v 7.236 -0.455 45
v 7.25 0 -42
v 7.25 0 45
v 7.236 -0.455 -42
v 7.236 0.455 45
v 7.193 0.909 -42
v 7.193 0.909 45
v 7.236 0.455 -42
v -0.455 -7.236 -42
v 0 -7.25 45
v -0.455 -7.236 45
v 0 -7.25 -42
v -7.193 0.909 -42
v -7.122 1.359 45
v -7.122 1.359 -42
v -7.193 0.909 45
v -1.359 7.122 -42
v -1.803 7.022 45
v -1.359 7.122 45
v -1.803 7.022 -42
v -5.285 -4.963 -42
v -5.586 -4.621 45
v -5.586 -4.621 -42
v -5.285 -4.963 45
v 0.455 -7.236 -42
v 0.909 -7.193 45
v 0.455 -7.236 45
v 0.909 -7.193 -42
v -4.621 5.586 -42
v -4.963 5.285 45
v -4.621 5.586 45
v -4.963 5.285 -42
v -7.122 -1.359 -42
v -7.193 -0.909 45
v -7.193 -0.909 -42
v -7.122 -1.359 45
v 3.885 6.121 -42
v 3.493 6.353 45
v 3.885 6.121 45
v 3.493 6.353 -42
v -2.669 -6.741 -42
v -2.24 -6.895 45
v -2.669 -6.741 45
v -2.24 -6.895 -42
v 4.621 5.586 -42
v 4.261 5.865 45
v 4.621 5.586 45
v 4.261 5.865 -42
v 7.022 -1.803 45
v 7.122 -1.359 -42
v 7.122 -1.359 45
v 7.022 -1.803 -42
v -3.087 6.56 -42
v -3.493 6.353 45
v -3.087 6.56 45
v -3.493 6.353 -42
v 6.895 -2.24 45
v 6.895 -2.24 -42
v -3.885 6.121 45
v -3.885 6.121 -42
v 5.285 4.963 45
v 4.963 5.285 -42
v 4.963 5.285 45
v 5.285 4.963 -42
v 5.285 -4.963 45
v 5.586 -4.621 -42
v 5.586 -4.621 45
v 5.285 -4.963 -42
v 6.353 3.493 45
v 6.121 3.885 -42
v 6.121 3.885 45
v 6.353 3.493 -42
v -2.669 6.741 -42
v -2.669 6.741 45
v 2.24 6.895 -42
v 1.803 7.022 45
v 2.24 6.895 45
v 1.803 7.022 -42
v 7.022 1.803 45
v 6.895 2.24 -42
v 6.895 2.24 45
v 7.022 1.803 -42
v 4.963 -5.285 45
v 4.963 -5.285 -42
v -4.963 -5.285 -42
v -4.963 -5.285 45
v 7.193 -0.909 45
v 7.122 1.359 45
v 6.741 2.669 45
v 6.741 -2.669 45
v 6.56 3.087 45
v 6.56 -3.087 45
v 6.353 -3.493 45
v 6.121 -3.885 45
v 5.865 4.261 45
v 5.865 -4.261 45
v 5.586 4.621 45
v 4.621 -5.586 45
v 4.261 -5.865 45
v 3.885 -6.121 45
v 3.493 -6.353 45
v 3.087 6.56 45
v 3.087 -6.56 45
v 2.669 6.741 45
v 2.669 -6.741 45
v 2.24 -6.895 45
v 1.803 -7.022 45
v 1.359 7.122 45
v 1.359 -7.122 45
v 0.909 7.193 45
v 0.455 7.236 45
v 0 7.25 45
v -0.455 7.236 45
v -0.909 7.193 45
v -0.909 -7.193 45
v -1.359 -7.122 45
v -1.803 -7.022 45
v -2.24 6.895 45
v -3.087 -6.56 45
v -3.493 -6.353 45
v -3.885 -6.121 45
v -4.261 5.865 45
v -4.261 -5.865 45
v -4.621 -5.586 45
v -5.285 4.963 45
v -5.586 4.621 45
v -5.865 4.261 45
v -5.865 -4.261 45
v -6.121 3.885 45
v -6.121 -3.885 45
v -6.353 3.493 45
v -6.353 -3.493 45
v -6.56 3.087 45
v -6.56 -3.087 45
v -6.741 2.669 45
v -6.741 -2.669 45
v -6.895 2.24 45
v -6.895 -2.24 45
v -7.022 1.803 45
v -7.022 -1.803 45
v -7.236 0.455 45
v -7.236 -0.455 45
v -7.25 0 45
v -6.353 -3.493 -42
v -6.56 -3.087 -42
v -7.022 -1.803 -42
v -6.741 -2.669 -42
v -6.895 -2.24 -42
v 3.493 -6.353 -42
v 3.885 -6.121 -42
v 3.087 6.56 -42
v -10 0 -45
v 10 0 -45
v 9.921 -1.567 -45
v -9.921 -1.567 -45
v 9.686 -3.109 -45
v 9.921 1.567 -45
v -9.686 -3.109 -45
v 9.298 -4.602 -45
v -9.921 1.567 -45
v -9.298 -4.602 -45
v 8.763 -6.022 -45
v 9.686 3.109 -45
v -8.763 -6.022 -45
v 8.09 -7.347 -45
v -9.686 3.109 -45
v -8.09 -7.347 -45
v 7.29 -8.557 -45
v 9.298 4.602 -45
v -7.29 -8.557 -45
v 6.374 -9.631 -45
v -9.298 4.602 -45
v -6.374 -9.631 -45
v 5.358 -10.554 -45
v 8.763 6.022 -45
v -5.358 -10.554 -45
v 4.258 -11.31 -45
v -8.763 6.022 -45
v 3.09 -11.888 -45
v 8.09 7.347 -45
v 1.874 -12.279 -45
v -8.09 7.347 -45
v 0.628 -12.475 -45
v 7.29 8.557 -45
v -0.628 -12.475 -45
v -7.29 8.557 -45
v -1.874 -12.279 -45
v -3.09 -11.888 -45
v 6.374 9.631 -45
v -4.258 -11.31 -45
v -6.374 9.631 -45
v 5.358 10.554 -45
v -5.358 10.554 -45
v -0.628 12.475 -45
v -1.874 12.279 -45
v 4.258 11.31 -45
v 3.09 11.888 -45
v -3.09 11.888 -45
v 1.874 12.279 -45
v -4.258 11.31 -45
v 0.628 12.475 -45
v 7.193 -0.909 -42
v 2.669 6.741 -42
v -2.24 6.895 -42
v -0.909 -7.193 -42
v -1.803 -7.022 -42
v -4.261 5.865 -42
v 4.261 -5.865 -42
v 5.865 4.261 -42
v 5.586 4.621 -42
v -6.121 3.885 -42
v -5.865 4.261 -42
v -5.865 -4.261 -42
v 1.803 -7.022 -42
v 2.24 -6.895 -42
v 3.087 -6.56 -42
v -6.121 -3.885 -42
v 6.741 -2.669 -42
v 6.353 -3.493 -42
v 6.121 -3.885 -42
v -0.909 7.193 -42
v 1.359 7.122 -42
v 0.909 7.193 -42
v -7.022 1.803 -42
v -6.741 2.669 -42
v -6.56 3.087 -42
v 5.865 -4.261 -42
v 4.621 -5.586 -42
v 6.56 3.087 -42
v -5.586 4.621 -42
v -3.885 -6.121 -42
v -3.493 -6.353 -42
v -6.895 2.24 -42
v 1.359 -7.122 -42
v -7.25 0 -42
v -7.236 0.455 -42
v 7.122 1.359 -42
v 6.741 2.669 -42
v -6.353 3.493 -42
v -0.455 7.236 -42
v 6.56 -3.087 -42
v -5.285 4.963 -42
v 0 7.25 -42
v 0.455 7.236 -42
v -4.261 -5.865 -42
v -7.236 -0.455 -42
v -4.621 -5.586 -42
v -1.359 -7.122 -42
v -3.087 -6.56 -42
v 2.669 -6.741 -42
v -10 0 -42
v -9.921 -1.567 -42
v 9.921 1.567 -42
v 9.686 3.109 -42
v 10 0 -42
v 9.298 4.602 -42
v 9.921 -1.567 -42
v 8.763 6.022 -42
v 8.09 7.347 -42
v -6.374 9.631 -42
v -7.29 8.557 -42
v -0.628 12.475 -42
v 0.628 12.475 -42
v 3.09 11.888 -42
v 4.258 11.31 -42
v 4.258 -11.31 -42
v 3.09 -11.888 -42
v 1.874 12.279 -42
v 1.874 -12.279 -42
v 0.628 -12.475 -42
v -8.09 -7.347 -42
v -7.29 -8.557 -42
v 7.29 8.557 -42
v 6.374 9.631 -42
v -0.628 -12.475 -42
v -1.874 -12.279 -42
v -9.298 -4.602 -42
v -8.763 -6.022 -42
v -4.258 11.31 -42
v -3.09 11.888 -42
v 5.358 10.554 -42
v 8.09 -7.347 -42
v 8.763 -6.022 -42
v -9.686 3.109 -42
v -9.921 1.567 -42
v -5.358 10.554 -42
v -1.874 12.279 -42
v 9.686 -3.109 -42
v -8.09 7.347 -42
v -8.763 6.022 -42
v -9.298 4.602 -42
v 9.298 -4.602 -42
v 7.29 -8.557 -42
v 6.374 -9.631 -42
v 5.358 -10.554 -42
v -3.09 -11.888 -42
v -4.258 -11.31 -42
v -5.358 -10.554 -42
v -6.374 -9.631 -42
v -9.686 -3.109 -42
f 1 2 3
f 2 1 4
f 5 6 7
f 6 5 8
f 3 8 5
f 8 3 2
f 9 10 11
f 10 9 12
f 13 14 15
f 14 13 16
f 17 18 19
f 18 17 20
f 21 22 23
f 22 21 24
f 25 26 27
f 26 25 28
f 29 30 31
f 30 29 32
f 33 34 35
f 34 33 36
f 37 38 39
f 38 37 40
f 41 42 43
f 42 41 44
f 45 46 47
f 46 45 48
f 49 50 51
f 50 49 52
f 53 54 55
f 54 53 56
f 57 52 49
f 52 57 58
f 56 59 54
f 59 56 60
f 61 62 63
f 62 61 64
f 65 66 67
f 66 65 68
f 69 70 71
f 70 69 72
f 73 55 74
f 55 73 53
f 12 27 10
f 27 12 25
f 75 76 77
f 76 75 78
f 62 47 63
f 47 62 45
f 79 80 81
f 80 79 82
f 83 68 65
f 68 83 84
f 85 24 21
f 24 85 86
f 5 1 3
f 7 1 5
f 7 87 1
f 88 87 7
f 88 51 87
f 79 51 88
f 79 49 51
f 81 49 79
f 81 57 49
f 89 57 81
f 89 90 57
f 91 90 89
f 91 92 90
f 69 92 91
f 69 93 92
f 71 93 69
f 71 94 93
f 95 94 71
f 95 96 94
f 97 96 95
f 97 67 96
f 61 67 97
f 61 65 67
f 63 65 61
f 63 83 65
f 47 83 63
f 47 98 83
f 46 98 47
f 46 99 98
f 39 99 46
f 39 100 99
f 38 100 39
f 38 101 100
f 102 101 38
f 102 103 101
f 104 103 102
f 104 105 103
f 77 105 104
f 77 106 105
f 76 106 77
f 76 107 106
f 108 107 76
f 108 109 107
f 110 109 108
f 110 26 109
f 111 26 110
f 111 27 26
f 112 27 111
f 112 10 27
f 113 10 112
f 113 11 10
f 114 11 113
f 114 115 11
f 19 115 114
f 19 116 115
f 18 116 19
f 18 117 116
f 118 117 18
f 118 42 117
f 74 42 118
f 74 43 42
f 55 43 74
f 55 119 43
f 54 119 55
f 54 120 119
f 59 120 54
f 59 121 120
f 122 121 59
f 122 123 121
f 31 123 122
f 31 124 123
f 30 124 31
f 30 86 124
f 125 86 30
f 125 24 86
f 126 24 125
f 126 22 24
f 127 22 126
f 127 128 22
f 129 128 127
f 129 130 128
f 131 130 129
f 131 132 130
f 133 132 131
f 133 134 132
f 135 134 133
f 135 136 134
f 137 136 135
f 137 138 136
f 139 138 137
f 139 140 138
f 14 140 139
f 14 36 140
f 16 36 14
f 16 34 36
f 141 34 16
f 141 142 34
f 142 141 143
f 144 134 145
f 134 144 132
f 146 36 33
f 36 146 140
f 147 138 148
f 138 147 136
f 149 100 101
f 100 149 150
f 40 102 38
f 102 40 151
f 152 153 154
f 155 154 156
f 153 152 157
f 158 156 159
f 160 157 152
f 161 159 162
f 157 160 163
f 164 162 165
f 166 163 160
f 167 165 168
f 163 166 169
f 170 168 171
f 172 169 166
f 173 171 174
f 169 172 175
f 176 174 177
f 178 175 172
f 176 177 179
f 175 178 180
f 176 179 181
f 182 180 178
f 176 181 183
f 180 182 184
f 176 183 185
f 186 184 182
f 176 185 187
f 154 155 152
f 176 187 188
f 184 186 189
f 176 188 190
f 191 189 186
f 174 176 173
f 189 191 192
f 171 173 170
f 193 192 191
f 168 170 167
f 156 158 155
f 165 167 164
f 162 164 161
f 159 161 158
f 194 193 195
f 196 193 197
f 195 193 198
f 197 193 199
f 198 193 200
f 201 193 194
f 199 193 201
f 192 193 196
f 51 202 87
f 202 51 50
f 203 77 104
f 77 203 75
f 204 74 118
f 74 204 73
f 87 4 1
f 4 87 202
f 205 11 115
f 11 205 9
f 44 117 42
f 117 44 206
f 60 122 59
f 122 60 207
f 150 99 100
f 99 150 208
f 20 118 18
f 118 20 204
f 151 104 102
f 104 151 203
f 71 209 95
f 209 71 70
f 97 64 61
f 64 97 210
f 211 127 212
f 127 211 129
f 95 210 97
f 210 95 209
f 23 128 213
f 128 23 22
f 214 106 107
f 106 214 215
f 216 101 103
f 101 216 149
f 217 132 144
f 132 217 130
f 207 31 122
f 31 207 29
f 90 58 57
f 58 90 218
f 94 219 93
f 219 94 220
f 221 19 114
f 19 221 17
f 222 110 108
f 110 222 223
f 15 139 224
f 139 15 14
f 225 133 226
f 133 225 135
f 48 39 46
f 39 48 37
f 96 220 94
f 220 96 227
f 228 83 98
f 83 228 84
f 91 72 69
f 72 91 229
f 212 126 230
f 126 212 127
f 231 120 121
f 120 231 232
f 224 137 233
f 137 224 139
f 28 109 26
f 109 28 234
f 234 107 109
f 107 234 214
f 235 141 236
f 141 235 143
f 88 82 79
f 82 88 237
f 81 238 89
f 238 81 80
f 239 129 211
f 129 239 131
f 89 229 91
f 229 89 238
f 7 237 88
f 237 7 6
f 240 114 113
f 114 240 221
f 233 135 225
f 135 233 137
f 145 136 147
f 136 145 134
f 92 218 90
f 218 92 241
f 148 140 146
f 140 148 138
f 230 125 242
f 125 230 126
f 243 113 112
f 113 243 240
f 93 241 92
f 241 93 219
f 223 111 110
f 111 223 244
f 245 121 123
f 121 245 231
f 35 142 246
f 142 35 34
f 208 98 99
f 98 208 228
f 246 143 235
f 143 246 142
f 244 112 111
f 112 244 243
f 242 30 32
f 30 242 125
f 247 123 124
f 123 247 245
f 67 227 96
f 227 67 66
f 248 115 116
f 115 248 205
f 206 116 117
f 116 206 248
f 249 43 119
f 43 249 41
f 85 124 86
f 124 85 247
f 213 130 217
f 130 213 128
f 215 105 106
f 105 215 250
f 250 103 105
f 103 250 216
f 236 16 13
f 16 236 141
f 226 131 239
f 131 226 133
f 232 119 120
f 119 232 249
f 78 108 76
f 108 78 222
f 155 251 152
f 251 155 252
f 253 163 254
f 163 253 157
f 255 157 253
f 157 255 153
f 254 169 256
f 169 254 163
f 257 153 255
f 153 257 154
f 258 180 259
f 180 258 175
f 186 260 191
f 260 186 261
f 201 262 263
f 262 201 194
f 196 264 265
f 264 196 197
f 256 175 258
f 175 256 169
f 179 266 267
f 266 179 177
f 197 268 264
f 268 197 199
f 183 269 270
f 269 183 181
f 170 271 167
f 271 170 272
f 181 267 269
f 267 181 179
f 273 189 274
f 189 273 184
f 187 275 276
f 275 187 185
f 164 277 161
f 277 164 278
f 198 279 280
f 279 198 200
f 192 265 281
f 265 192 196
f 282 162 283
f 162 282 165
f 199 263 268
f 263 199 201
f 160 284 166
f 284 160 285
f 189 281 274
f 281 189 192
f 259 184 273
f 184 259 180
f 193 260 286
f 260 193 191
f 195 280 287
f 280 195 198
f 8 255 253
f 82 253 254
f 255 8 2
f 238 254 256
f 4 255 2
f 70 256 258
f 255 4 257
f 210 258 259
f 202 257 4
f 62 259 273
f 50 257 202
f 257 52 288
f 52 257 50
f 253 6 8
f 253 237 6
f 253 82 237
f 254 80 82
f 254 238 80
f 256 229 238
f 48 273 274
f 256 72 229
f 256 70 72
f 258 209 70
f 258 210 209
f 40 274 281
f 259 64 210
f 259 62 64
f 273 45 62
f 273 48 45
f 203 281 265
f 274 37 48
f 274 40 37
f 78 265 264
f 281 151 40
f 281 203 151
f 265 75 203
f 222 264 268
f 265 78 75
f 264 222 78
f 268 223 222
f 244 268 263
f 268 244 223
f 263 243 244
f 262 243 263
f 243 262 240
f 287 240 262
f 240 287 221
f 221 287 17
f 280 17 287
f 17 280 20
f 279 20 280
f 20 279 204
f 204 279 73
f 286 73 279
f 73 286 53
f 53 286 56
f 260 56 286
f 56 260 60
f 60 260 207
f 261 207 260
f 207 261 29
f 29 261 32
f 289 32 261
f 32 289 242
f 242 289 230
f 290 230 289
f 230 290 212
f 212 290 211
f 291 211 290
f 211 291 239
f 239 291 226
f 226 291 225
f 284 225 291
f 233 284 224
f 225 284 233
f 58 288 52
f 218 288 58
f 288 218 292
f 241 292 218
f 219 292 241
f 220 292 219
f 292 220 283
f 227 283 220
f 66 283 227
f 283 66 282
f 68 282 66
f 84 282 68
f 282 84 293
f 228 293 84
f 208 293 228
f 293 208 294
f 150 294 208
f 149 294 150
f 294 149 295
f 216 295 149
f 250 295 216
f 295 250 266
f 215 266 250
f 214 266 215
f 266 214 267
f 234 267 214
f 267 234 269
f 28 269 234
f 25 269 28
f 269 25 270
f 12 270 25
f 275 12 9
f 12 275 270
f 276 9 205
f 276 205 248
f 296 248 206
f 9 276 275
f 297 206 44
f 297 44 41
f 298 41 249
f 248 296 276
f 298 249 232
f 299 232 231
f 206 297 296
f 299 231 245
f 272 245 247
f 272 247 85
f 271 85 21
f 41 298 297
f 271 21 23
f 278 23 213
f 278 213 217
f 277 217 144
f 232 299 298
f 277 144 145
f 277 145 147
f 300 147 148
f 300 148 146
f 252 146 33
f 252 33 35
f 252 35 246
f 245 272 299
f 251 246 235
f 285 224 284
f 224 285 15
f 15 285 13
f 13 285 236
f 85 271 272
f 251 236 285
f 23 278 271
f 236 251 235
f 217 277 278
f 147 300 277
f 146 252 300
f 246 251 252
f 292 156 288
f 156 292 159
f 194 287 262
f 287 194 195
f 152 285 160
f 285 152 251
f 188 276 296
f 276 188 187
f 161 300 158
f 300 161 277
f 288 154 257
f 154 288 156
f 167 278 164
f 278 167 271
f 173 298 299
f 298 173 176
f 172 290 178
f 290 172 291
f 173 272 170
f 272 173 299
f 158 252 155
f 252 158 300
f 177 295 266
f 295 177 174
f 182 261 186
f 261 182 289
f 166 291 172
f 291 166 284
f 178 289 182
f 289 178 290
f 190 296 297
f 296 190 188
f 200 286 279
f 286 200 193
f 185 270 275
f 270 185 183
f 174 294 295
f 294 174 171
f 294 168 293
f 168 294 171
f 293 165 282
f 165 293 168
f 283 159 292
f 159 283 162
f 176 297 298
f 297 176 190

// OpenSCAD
plunger_length = 90;
plunger_diam = 14.5;
base_th = 3;
base_diam = 25;


//-- Body
cylinder(r = plunger_diam/2, h = plunger_length, center = true, $fn = 100);

//-- Base
translate([0, 0, base_th/2 - plunger_length/2])
scale([0.8,1,1])
cylinder(r = base_diam/2, h = base_th, center = true, $fn = 50);
